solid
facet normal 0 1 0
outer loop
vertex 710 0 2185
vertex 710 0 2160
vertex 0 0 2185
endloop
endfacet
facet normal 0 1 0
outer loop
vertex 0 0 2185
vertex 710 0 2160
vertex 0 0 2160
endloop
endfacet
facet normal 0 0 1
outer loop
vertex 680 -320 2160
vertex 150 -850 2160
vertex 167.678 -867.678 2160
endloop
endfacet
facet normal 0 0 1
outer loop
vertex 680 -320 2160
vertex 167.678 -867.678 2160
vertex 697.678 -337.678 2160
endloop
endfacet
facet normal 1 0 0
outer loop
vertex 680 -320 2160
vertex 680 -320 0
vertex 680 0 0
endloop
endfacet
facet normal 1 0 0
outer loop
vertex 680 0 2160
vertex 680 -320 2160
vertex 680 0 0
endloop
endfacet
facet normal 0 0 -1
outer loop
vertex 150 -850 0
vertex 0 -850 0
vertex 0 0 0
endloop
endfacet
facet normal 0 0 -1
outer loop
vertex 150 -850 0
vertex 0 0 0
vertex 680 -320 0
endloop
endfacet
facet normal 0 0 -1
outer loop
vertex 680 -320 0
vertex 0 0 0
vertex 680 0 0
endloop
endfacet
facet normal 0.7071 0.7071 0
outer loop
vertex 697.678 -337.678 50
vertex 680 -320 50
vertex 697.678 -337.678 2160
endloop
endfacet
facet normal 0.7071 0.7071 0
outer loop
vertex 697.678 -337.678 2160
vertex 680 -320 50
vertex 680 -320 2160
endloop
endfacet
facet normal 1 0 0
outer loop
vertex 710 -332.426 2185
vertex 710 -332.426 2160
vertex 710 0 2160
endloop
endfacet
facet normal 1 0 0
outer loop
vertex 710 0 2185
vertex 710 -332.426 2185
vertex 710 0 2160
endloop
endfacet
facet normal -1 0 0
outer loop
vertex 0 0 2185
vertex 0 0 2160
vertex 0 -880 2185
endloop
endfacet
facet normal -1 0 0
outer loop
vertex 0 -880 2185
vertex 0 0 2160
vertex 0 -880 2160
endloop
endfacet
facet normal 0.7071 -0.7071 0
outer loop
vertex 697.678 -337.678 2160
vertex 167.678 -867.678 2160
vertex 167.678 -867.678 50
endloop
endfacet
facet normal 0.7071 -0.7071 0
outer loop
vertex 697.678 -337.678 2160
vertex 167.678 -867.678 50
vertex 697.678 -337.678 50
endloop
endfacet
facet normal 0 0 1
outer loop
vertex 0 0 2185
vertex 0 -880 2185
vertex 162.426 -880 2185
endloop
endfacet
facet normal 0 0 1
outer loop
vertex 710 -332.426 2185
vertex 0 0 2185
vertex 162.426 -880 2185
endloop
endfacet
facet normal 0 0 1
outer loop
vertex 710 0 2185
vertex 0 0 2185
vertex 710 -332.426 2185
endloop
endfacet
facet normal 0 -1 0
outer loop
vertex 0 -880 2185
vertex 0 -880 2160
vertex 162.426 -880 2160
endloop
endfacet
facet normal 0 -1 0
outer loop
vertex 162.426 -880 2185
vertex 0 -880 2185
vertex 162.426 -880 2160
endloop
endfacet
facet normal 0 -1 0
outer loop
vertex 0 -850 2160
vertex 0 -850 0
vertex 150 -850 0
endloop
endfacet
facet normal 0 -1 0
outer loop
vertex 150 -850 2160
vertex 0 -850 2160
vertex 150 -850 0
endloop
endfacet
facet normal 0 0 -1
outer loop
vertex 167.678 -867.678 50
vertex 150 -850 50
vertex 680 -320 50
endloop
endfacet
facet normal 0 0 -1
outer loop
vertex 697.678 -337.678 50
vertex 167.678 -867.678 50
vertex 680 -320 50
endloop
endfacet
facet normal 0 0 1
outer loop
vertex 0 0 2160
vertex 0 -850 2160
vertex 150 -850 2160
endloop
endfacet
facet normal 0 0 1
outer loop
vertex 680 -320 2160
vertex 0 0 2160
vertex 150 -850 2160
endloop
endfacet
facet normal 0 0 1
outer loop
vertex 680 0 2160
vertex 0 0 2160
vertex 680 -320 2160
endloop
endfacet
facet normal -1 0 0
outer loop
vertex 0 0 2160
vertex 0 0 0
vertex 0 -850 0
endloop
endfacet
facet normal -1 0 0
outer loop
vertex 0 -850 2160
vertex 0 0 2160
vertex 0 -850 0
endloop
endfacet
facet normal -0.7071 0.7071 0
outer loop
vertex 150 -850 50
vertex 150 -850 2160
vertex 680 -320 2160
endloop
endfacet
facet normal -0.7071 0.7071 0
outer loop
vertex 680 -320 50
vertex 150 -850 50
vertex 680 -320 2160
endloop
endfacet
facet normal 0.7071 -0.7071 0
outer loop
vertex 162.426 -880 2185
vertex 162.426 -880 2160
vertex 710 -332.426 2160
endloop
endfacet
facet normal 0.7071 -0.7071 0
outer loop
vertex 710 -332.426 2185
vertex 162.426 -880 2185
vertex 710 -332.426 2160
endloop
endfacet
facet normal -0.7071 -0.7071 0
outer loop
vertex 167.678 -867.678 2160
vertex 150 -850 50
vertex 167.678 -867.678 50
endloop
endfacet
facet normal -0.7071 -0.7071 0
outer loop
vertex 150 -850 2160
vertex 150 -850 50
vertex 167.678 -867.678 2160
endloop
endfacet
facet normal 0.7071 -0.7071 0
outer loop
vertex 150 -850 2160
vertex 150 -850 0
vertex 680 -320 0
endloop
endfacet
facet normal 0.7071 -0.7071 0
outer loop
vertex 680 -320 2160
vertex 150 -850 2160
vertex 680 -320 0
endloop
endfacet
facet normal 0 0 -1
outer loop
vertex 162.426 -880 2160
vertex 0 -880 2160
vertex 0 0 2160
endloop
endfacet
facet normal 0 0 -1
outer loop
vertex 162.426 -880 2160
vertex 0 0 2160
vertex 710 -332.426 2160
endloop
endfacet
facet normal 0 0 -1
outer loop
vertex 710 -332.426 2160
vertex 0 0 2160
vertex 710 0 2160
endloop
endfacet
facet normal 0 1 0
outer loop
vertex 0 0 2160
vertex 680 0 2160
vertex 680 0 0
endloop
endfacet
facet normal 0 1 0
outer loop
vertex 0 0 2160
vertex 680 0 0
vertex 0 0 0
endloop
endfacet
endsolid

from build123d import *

# Parameters (mm, degrees)
F2_DEPTH = 2160
F3_W     = 749.5331880577
F3_H     = 2110
F4_DEPTH = 25
F6_DEPTH = 25


with BuildPart() as f2:
    # F1 (on Top) → F2 (new body)
    with BuildSketch(Plane.XY):
        Polygon((680, 0), (0, 0), (0, -850), (150, -850), (680, -320), align=None)
    extrude(amount=F2_DEPTH)


with BuildPart() as f4:
    # F3 (on face) → F4 (new body)
    with BuildSketch(Plane(origin=(500, -500, 0), x_dir=(0.7071067812, 0.7071067812, 0), z_dir=(0.7071067812, -0.7071067812, 0))):
        with Locations((-120.2081528017, 1105)):
            Rectangle(F3_W, F3_H)
    extrude(amount=F4_DEPTH)


with BuildPart() as f6:
    # F5 (on face) → F6 (new body)
    with BuildSketch(Plane.XY.offset(2160)):
        Polygon((162.4264068712, -880), (710, -332.4264068712), (710, 0), (0, 0), (0, -880), align=None)
    extrude(amount=F6_DEPTH)


solid = Compound([f2.part, f4.part, f6.part])
